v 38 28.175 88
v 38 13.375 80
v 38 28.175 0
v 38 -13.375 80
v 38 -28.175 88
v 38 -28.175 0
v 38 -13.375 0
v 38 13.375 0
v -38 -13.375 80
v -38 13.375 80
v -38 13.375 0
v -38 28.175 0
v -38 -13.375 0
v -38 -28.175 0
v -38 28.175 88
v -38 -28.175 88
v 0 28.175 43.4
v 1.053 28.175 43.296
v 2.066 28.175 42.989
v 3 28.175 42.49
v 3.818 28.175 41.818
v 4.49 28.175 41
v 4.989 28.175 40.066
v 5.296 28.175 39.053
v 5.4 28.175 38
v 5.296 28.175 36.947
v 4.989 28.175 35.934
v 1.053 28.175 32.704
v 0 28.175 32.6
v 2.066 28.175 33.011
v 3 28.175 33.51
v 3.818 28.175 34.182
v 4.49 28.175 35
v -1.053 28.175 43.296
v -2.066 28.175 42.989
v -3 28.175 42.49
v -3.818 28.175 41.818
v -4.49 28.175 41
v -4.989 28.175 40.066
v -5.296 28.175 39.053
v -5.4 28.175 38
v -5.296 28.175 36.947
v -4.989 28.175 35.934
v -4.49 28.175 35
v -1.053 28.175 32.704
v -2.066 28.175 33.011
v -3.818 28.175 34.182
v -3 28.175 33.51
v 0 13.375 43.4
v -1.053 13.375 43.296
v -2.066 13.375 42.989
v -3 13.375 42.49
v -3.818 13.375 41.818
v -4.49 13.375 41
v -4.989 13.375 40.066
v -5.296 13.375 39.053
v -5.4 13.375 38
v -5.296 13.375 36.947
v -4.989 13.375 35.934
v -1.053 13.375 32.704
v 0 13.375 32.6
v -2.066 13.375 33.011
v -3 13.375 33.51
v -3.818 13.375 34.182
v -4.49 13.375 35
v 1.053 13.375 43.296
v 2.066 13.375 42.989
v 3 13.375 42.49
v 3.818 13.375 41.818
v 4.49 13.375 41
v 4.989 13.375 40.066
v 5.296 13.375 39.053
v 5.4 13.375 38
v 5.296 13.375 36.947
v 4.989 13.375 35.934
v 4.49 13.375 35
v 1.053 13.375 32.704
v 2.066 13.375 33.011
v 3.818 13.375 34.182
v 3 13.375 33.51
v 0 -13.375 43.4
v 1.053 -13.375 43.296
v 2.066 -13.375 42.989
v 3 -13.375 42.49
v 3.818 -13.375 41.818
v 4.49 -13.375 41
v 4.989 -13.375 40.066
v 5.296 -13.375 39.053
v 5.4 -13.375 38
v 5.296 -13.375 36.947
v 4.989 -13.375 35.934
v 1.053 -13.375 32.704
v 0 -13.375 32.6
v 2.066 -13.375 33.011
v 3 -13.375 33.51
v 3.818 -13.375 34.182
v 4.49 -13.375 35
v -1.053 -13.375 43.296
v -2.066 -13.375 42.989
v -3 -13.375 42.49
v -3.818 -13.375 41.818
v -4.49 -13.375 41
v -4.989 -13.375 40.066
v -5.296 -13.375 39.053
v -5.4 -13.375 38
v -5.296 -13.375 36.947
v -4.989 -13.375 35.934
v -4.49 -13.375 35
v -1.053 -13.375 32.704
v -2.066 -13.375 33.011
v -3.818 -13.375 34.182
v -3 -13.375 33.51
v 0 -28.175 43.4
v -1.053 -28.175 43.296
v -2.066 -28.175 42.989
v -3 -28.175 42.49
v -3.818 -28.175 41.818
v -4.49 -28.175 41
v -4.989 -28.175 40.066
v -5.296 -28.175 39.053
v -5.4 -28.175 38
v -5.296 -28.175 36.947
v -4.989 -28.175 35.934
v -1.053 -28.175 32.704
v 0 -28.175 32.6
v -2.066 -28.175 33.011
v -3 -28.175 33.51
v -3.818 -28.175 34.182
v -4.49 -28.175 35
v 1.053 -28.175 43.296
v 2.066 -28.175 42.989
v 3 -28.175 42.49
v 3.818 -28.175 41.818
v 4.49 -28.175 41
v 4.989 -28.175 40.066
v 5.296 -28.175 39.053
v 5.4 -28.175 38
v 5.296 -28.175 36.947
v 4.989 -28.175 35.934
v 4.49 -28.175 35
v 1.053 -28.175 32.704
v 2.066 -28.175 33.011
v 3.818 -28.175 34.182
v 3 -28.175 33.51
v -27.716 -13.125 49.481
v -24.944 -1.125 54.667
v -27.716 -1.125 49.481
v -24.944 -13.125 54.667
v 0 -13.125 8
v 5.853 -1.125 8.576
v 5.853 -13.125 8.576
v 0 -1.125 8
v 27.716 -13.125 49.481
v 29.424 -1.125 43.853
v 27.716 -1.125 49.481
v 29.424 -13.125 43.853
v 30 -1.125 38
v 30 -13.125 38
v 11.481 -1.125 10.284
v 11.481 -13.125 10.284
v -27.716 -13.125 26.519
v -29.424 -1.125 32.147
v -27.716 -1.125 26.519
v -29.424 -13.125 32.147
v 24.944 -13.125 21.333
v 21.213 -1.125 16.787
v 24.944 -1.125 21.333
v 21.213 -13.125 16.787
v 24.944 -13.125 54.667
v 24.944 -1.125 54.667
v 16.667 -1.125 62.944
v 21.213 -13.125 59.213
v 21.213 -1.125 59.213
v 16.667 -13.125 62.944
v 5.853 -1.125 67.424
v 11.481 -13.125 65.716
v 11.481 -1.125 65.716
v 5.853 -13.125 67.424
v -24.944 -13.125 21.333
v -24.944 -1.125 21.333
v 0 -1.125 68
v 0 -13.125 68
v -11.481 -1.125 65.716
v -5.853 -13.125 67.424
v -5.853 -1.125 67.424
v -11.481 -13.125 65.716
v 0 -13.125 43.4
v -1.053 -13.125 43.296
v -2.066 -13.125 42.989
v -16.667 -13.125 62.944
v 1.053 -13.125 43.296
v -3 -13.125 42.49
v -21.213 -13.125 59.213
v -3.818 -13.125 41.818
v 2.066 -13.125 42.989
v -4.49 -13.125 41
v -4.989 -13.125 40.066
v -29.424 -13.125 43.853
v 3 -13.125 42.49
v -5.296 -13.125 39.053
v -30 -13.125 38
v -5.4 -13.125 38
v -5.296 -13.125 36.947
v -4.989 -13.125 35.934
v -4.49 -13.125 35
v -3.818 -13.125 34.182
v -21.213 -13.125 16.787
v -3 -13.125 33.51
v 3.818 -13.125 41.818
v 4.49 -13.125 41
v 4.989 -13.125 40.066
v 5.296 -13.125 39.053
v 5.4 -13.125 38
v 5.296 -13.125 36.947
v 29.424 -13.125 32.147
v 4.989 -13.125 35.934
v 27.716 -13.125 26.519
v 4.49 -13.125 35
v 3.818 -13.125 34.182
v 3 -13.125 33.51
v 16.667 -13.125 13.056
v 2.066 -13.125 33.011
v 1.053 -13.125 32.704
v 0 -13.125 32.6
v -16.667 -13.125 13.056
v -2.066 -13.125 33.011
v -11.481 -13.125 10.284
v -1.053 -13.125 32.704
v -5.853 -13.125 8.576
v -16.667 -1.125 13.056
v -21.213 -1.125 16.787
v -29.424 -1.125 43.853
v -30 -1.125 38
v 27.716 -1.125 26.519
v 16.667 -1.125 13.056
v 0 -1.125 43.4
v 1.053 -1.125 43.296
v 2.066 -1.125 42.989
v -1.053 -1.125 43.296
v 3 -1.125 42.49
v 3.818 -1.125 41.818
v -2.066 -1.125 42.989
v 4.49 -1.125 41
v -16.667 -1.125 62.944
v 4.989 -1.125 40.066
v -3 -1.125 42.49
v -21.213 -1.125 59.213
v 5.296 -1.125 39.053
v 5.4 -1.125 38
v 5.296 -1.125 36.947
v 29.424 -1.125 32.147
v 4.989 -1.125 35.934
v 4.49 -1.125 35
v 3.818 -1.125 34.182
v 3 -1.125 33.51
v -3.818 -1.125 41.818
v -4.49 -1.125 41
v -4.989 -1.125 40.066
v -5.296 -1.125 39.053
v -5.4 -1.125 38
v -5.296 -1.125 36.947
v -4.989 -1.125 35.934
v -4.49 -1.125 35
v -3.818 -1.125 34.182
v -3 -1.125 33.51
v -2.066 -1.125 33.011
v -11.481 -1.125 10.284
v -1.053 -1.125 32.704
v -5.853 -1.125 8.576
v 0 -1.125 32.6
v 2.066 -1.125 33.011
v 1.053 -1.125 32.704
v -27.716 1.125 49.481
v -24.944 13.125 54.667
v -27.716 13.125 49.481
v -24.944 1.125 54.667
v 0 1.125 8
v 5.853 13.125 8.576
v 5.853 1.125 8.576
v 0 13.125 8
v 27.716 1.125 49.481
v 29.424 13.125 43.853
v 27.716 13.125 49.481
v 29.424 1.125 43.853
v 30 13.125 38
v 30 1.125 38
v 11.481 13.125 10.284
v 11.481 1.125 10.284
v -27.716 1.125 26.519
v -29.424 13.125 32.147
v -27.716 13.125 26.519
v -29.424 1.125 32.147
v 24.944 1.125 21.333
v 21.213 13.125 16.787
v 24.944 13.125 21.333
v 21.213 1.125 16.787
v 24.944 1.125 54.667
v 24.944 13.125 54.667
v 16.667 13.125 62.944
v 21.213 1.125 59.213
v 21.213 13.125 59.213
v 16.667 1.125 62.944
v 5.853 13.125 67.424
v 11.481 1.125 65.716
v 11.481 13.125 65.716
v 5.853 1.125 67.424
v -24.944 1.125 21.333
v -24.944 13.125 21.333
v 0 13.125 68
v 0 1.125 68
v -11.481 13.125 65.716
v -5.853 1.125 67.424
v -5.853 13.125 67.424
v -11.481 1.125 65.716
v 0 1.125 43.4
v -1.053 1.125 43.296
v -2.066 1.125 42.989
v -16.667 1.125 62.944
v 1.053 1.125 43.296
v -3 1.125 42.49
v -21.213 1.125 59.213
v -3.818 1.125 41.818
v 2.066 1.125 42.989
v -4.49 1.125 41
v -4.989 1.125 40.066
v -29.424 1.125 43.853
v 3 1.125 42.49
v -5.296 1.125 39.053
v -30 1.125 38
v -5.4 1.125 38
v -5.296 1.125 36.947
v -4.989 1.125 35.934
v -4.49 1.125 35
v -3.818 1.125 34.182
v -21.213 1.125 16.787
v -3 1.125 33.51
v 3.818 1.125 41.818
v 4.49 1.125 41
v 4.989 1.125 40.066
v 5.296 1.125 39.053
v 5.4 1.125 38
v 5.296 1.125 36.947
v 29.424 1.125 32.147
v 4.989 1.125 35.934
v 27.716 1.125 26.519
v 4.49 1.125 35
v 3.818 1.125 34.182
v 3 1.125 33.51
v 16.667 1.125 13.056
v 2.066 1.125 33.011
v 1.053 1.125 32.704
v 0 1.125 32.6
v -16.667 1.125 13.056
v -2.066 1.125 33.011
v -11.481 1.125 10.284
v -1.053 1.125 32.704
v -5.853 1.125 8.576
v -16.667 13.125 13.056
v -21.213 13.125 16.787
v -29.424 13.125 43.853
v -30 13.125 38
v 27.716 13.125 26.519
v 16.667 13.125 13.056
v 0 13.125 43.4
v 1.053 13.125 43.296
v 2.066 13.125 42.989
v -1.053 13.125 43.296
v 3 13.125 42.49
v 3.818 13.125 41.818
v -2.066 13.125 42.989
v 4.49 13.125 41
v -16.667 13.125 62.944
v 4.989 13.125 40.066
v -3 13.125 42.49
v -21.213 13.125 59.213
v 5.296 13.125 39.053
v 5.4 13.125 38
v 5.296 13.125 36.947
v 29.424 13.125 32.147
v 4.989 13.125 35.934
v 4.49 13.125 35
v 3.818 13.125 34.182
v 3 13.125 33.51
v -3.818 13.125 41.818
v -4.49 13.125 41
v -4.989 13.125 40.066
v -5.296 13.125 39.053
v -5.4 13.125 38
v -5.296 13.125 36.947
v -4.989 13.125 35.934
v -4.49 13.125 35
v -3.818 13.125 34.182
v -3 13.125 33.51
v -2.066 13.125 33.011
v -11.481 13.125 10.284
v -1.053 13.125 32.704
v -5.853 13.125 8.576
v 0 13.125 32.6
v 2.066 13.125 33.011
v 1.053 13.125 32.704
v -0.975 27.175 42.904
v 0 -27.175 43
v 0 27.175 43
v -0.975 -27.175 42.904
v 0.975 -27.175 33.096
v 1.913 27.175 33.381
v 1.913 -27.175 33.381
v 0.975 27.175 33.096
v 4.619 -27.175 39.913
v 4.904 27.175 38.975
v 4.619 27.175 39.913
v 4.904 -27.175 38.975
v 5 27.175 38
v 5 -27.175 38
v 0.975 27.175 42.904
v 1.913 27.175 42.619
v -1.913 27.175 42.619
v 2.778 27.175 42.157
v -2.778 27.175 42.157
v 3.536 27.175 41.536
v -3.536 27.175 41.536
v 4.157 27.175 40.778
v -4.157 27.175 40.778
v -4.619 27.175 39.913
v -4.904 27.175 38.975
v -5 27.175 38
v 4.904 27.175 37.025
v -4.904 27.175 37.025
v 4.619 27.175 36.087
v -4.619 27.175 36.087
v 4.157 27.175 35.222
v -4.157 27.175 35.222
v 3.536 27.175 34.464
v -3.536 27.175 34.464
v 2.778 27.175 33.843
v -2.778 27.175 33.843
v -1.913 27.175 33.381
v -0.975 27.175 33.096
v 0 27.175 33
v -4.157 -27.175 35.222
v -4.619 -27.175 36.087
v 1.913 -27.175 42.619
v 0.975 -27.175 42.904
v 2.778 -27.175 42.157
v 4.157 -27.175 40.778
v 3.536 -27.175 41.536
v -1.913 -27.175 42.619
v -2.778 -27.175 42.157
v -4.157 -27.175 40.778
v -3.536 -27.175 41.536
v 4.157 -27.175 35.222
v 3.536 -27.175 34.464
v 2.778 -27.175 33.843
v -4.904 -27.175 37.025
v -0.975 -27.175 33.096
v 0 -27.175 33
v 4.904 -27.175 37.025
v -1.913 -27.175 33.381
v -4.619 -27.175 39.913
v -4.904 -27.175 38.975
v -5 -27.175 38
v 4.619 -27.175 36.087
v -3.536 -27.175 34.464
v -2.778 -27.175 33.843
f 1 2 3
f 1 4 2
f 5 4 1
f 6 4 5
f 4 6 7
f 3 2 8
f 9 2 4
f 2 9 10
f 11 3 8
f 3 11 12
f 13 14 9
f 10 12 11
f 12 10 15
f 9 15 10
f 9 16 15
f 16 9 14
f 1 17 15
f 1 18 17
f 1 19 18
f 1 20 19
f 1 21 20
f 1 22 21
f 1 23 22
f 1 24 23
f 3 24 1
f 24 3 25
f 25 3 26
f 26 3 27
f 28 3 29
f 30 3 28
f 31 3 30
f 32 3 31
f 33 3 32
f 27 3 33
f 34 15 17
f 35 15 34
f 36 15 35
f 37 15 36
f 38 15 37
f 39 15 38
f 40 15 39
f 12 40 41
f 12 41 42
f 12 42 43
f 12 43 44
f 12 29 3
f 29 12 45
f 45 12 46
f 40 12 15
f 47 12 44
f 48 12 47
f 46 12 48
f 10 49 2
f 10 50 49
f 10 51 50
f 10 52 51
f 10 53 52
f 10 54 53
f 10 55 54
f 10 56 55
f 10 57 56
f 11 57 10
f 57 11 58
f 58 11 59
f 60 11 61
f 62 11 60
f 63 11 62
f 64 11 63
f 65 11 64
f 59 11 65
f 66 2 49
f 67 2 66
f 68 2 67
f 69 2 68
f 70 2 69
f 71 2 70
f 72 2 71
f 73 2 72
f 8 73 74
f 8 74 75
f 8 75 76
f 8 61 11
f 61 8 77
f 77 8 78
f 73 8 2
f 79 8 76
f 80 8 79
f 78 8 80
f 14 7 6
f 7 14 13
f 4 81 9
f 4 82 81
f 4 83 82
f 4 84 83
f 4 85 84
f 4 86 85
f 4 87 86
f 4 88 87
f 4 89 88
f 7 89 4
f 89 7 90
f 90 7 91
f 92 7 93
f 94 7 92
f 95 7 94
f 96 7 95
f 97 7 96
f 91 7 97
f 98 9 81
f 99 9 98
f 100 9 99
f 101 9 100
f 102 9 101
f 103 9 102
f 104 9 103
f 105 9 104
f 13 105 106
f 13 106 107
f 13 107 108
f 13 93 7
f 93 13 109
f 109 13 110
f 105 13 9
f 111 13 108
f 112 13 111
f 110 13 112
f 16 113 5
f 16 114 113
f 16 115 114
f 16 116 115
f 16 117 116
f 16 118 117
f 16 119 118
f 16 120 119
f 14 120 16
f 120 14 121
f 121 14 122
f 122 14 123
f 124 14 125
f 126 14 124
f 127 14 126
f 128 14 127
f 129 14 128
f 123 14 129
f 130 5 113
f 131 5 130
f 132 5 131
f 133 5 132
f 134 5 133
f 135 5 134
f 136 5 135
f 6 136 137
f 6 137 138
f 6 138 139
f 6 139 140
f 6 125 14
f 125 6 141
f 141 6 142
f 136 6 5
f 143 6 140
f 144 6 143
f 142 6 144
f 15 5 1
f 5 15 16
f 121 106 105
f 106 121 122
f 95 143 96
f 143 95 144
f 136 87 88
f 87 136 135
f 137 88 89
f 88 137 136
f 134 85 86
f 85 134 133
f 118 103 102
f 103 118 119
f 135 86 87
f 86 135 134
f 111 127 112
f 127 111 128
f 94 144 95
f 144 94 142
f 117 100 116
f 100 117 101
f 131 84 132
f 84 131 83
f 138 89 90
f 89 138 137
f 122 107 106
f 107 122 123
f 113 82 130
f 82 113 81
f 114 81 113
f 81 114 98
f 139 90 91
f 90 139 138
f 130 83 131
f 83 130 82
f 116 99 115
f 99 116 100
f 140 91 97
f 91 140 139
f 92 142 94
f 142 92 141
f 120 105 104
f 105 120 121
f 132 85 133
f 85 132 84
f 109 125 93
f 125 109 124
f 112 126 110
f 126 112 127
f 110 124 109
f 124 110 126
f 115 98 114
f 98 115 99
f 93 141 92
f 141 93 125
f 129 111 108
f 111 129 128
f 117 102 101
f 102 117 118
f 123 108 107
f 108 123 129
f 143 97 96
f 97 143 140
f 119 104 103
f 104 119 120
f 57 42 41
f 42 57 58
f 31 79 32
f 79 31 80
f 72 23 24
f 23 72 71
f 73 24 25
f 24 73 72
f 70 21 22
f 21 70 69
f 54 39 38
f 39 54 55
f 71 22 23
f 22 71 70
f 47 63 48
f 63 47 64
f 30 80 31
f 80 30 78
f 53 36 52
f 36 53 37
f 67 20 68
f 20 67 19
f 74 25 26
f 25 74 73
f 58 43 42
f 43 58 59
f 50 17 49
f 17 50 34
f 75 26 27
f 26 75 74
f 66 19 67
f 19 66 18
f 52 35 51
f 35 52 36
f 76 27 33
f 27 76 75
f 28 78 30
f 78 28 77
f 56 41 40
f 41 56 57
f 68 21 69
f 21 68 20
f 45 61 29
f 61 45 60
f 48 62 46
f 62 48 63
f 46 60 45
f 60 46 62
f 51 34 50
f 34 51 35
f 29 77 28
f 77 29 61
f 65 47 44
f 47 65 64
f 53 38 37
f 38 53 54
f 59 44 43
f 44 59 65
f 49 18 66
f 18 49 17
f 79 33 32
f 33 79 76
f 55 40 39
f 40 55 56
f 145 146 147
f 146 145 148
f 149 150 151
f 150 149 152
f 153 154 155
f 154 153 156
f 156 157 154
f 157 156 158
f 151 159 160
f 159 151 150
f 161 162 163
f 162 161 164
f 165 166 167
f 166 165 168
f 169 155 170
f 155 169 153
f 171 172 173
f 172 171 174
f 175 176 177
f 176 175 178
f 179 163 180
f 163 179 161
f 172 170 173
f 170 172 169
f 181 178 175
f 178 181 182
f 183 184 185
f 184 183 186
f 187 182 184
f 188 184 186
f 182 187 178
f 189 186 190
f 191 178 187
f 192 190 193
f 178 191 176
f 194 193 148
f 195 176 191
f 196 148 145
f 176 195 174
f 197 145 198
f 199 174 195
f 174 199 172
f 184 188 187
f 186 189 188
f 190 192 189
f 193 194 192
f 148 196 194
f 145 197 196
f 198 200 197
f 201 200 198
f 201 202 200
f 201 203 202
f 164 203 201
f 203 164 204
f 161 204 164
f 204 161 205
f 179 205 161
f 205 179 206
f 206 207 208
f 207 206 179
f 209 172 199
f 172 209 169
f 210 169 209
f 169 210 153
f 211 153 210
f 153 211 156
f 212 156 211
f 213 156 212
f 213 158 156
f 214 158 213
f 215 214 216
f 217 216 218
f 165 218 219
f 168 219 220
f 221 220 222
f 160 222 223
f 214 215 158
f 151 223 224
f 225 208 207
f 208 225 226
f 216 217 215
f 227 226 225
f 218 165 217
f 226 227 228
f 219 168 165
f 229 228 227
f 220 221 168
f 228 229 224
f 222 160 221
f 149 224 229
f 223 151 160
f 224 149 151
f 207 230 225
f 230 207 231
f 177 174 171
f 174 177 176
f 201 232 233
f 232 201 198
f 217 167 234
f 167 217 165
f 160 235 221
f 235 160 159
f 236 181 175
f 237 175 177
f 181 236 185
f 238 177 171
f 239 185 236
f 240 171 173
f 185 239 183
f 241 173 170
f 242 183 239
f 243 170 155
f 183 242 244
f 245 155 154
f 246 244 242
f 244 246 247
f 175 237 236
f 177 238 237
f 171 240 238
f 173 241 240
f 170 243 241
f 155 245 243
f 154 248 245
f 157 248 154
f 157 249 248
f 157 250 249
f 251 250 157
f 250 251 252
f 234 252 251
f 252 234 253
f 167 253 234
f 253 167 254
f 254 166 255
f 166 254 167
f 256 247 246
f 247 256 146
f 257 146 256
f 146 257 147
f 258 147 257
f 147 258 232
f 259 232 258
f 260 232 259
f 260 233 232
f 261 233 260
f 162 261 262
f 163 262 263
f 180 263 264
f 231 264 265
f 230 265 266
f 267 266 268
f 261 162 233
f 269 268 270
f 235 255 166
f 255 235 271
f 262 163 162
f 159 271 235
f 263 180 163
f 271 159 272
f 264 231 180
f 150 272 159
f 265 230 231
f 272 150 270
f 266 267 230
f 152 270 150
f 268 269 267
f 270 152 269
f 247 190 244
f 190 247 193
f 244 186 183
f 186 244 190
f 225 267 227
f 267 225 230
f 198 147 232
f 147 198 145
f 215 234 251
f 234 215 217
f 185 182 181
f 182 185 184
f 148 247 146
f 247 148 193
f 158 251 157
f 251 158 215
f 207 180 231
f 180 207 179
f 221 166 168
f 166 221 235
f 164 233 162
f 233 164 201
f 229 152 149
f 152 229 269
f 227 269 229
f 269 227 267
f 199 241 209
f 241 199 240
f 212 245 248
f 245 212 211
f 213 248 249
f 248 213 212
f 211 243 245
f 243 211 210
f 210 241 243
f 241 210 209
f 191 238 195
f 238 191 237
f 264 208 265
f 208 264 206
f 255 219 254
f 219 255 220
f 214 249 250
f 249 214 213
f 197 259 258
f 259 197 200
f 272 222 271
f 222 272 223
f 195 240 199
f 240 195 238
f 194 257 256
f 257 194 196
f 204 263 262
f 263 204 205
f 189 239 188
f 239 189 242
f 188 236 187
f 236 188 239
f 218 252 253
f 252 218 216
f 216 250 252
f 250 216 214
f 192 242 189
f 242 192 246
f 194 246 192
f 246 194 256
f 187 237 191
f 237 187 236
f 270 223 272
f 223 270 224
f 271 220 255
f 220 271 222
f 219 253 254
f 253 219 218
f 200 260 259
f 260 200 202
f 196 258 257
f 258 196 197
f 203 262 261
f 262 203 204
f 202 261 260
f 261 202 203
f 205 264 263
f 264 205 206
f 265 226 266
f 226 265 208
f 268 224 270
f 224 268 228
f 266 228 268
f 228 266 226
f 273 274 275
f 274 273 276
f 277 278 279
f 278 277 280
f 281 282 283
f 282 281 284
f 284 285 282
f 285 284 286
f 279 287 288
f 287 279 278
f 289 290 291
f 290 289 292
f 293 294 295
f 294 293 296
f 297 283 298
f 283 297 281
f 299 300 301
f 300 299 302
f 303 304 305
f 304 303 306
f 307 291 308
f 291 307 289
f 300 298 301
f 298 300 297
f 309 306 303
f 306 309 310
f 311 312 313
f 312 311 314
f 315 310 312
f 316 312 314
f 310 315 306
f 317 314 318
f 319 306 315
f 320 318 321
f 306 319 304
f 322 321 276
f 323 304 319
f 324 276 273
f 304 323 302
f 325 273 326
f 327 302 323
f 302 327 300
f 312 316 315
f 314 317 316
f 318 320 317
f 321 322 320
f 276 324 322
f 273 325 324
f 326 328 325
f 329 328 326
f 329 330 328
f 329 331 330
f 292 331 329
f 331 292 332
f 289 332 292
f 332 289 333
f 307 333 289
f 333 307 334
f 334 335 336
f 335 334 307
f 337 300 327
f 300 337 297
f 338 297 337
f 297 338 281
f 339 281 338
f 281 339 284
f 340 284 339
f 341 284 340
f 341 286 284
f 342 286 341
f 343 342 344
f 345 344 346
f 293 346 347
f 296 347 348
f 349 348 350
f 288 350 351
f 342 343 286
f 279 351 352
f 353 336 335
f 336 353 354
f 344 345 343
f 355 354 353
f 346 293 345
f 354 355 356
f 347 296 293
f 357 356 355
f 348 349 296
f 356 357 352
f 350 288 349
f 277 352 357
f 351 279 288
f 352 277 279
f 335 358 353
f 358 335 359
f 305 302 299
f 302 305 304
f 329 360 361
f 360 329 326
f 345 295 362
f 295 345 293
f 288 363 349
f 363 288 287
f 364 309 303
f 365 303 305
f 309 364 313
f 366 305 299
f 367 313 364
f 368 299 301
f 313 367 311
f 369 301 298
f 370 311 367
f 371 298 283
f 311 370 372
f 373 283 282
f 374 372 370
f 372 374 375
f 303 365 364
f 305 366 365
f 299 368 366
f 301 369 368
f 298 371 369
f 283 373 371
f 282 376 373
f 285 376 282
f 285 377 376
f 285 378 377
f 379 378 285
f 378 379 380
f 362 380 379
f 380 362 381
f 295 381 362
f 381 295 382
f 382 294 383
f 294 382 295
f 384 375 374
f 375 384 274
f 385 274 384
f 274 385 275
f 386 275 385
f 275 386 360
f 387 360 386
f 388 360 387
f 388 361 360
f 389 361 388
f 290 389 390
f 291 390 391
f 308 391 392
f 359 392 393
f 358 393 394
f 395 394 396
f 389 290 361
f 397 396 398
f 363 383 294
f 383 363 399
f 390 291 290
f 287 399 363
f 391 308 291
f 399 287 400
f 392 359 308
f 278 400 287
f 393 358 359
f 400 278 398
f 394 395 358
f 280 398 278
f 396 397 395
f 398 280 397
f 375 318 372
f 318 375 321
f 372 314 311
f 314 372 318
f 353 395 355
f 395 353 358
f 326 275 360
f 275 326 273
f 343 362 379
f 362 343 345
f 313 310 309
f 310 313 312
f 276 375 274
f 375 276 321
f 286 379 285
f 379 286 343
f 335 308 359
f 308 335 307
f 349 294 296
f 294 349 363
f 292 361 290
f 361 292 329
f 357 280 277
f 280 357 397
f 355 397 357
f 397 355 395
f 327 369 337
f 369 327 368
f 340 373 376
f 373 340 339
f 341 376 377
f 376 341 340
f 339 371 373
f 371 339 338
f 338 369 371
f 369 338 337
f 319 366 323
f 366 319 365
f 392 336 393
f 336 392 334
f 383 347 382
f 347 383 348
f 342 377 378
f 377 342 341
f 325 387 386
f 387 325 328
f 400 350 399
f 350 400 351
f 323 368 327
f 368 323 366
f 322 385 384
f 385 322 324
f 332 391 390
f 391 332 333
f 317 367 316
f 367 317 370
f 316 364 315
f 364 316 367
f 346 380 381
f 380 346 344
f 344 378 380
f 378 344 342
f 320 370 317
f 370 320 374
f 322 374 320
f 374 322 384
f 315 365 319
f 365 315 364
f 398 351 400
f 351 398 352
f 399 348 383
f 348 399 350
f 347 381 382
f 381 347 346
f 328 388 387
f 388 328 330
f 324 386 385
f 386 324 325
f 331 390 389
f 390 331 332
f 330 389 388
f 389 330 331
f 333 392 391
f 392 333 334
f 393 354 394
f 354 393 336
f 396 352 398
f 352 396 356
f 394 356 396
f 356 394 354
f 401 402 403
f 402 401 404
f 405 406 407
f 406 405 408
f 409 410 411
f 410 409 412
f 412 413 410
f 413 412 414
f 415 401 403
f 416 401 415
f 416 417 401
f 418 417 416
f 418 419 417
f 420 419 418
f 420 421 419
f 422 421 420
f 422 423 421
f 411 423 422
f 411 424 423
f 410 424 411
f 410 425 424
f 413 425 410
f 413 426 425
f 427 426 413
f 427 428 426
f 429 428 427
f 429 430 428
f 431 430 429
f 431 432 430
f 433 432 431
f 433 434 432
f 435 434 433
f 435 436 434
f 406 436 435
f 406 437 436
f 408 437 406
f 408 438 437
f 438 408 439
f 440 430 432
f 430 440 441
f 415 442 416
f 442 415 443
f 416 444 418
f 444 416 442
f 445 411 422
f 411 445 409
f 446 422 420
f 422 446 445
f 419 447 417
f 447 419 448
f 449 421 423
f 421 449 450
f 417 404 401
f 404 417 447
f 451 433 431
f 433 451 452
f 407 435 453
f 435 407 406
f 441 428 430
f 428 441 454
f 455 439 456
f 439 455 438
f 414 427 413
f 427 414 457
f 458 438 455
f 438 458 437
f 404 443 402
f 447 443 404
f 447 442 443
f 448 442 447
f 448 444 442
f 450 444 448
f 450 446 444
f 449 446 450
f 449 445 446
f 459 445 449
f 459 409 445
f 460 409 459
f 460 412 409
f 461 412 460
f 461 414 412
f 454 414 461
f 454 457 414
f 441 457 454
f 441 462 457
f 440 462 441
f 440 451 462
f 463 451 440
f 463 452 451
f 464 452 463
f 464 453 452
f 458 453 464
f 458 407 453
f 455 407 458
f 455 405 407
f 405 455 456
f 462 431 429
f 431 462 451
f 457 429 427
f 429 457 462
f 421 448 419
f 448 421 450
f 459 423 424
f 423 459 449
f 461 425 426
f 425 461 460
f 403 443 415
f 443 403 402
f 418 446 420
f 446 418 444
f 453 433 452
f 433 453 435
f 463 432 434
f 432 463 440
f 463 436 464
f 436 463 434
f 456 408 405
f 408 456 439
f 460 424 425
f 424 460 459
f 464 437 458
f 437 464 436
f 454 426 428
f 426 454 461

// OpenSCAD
$fn = 32;

// ------------------------------------------------------------------------
// Trolley wheel set: wheels d60, fork 80 mm tall
// Every part is its own module, assembly() places every instance.
// ------------------------------------------------------------------------

// --- part 1 ---
module trolley_fork() {
  difference() {
    union() {
      translate([-38, 13.375, 0]) cube([76, 14.8, 80]);
      translate([-38, -28.175, 0]) cube([76, 14.8, 80]);
      translate([-38, -28.175, 80]) cube([76, 56.35, 8]);
    }
    translate([0, -20.775, 38]) rotate([90, 0, 0]) cylinder(h = 16.8, d = 10.8, center = true);
    translate([0, 20.775, 38]) rotate([90, 0, 0]) cylinder(h = 16.8, d = 10.8, center = true);
  }
}

// --- part 2 ---
module trolley_wheel() {
  difference() {
      translate([0, 0, 0]) cylinder(h = 12, d = 60);
      translate([0, 0, -1]) cylinder(h = 14, d = 10.8);
    }
}

// --- part 3 ---
module trolley_axle() {
  translate([0, 0, -27.175]) cylinder(h = 54.35, d = 10);
}

// --- assembly ---
module assembly() {
  color([0.80, 0.24, 0.20]) translate([0, 0, 0]) rotate([0, 0, 0]) trolley_fork();
  color([0.20, 0.45, 0.75]) translate([0, -1.125, 38]) rotate([90, 0, 0]) trolley_wheel();
  color([0.25, 0.62, 0.32]) translate([0, 13.125, 38]) rotate([90, 0, 0]) trolley_wheel();
  color([0.92, 0.70, 0.18]) translate([0, 0, 38]) rotate([90, 0, 0]) trolley_axle();
}

assembly();
